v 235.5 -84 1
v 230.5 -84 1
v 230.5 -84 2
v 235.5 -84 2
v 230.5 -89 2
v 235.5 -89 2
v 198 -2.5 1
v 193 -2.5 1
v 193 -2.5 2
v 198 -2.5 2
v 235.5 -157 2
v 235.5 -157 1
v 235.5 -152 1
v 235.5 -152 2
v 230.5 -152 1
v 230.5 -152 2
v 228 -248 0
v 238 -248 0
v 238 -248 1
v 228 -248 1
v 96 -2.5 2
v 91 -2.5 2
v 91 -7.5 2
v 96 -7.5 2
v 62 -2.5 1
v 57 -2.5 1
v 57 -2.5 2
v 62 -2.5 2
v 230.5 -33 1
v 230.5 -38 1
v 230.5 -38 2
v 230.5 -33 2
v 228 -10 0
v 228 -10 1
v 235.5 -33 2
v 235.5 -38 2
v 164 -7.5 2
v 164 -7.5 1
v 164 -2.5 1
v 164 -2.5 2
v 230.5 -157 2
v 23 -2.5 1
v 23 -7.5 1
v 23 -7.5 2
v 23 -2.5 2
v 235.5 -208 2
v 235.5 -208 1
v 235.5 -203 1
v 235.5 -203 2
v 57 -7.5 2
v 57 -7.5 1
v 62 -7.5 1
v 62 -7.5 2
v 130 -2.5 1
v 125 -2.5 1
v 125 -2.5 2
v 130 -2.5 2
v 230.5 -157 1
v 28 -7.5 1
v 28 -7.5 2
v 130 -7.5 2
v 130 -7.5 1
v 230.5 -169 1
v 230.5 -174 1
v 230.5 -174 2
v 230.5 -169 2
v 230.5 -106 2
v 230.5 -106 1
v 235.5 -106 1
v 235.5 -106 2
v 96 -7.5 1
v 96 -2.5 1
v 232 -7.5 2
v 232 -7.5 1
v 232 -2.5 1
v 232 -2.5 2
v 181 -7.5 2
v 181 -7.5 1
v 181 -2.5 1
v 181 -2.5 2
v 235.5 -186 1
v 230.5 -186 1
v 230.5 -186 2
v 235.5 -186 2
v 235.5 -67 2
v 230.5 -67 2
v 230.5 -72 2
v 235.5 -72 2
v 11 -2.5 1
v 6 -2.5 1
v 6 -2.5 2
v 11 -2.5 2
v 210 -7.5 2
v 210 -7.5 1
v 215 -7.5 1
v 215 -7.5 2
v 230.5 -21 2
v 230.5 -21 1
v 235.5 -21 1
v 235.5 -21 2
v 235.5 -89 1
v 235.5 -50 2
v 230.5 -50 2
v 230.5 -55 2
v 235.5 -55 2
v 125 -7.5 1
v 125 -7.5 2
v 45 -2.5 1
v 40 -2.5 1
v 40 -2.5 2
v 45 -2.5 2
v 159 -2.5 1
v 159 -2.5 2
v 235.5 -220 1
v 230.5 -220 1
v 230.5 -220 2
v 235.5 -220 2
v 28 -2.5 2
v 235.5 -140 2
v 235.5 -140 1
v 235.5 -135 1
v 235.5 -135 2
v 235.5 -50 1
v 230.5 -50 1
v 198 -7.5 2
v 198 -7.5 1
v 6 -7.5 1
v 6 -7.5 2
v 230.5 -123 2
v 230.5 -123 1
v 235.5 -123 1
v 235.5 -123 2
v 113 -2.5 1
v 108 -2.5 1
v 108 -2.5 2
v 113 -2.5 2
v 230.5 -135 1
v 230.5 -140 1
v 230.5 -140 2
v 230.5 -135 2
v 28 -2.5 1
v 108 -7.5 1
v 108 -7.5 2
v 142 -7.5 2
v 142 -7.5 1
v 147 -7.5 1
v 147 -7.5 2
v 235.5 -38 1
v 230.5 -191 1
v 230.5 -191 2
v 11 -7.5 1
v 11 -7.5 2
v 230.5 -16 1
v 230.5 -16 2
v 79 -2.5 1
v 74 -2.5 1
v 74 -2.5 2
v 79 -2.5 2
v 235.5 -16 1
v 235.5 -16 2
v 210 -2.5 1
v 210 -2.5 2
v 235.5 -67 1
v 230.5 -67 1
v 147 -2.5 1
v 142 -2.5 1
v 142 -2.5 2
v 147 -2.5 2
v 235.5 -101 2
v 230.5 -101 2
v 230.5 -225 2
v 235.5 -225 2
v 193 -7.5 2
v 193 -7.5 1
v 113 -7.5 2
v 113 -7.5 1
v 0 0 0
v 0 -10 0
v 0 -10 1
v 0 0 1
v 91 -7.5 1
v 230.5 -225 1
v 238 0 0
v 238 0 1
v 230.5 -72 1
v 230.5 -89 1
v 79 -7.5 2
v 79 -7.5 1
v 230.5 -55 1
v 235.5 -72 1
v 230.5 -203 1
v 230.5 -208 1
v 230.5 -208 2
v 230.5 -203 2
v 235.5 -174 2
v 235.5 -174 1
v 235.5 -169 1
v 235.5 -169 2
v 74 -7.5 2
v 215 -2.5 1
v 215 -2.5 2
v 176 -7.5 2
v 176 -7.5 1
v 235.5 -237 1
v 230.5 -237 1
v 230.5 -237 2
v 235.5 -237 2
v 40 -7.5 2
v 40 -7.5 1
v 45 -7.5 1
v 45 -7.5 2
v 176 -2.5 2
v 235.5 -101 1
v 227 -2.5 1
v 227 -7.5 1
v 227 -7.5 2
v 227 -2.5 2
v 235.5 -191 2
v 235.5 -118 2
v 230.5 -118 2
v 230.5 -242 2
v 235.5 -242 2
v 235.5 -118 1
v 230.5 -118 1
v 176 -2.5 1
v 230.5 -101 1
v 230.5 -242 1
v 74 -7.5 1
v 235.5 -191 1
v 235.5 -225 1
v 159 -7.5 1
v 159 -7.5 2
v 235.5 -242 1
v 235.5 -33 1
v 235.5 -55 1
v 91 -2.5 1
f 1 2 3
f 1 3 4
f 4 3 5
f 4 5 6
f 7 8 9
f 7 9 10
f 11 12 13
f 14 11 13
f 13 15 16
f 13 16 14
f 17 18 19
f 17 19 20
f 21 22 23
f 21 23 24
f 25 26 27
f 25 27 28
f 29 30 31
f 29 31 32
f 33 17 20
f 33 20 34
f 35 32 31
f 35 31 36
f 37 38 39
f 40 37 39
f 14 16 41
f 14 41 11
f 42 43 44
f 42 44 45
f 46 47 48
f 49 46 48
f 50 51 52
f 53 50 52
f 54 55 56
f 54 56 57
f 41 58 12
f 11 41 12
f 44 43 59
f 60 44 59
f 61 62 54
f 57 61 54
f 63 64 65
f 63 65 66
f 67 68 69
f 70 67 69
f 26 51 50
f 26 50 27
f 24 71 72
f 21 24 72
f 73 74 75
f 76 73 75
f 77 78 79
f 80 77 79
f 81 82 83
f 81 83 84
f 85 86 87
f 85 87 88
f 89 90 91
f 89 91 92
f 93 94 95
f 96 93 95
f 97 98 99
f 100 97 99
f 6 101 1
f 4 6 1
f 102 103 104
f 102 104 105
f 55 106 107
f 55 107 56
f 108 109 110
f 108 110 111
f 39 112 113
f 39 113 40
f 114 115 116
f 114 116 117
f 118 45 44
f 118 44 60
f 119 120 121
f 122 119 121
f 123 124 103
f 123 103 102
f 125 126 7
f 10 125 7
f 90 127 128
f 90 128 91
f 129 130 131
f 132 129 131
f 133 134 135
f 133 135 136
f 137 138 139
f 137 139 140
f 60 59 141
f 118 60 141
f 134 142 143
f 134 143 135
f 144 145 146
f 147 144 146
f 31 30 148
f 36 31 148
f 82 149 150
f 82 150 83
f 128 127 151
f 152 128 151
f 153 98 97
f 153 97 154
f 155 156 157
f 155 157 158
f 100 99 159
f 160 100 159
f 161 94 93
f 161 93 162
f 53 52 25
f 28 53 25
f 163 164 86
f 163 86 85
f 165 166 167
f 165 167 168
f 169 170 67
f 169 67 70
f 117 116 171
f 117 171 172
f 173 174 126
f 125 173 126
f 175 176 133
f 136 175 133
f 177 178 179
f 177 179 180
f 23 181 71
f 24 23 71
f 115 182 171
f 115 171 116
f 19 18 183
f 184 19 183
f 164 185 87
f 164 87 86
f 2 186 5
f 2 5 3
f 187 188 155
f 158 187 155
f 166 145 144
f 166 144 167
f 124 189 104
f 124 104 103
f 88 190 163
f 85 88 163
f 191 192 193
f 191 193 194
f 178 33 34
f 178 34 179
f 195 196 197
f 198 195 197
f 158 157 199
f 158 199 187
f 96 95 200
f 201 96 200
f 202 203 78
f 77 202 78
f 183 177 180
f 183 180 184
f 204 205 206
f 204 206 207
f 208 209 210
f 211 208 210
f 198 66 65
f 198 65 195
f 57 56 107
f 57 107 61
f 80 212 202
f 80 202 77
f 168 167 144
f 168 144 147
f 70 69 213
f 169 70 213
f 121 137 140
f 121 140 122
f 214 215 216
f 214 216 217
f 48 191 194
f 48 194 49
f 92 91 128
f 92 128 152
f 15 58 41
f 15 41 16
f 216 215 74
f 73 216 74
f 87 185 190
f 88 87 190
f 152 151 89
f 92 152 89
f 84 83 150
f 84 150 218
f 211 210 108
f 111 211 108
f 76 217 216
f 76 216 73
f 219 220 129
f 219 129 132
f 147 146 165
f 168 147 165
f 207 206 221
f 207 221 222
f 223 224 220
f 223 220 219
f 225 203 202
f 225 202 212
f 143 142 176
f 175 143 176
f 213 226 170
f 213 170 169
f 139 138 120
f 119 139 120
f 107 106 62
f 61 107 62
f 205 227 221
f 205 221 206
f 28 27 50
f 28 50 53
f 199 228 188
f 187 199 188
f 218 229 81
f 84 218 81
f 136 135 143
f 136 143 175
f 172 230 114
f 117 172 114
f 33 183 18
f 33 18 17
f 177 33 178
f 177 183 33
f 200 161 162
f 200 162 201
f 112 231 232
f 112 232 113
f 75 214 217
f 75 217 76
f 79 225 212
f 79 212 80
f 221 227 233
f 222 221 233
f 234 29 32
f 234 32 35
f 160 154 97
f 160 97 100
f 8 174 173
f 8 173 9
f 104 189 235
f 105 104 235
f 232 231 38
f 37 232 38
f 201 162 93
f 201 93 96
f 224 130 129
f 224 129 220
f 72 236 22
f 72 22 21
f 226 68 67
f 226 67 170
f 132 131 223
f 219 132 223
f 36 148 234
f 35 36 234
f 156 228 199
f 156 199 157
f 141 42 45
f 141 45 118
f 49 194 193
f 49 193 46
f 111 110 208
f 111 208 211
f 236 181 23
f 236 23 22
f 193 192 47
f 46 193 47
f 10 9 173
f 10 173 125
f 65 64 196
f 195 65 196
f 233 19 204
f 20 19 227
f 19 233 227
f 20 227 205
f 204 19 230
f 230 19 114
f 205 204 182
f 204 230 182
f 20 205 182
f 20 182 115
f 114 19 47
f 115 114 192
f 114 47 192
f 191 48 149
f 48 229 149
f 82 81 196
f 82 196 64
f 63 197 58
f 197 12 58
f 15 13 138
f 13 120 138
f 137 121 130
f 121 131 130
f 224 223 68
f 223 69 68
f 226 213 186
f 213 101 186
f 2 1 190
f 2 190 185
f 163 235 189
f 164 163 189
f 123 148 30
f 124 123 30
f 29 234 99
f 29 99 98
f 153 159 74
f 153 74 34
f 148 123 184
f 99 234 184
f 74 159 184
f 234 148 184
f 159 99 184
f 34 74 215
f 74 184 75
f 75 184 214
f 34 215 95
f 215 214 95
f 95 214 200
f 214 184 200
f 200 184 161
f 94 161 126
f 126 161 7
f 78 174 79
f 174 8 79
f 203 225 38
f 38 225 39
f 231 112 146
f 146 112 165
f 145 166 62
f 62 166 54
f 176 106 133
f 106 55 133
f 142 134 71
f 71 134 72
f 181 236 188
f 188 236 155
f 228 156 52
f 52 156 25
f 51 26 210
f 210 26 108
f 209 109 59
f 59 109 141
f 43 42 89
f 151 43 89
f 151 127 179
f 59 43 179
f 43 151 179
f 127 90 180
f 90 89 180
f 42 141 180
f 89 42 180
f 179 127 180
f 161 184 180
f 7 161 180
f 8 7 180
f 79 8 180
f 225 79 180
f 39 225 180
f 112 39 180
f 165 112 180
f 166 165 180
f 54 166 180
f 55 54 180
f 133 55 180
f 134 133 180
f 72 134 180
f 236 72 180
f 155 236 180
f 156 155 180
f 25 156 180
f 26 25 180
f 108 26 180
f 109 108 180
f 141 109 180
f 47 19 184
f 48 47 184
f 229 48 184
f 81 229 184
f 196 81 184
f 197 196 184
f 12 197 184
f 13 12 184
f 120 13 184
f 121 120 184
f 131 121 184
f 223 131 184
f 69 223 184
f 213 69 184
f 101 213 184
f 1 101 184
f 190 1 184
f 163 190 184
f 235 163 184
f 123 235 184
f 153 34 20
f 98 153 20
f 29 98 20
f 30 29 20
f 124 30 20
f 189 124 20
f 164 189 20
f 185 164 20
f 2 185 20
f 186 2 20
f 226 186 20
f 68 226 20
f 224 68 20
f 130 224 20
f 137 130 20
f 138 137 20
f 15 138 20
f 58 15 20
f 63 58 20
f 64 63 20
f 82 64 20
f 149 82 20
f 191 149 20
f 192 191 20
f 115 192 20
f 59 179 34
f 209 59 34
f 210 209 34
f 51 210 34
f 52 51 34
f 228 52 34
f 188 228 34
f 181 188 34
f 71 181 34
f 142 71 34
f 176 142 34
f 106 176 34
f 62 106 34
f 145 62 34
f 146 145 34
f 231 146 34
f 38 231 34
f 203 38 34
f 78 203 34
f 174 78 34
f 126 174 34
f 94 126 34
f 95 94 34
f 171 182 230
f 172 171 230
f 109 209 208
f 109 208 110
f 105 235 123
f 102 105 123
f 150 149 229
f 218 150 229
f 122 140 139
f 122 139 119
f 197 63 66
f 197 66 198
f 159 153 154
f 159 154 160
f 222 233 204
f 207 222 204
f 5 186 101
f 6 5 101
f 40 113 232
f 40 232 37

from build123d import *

# Parameters (mm, degrees)
EXTRUDE_1_DEPTH = 1
SKETCH_2_W      = 5
SKETCH_2_H      = 5
EXTRUDE_2_DEPTH = 1


with BuildPart() as part:
    # 草圖1 → 填料-伸長1 (new body)
    with BuildSketch(Plane.XY):
        Polygon((0, 0), (238, 0), (238, -10), (238, -248), (228, -248), (228, -10), (0, -10), align=None)
    extrude(amount=EXTRUDE_1_DEPTH)

    # 草圖2 → 填料-伸長2 (add)
    with BuildSketch(Plane.XY.offset(1)):
        with Locations((25.5, -5)):
            Rectangle(SKETCH_2_W, SKETCH_2_H)
        with Locations((8.5, -5)):
            Rectangle(SKETCH_2_W, SKETCH_2_H)
        with Locations((42.5, -5)):
            Rectangle(SKETCH_2_W, SKETCH_2_H)
        with Locations((59.5, -5)):
            Rectangle(SKETCH_2_W, SKETCH_2_H)
        with Locations((76.5, -5)):
            Rectangle(SKETCH_2_W, SKETCH_2_H)
        with Locations((93.5, -5)):
            Rectangle(SKETCH_2_W, SKETCH_2_H)
        with Locations((110.5, -5)):
            Rectangle(SKETCH_2_W, SKETCH_2_H)
        with Locations((127.5, -5)):
            Rectangle(SKETCH_2_W, SKETCH_2_H)
        with Locations((144.5, -5)):
            Rectangle(SKETCH_2_W, SKETCH_2_H)
        with Locations((161.5, -5)):
            Rectangle(SKETCH_2_W, SKETCH_2_H)
        with Locations((178.5, -5)):
            Rectangle(SKETCH_2_W, SKETCH_2_H)
        with Locations((195.5, -5)):
            Rectangle(SKETCH_2_W, SKETCH_2_H)
        with Locations((212.5, -5)):
            Rectangle(SKETCH_2_W, SKETCH_2_H)
        with Locations((229.5, -5)):
            Rectangle(SKETCH_2_W, SKETCH_2_H)
        with Locations((233, -222.5)):
            Rectangle(SKETCH_2_W, SKETCH_2_H)
        with Locations((233, -239.5)):
            Rectangle(SKETCH_2_W, SKETCH_2_H)
        with Locations((233, -205.5)):
            Rectangle(SKETCH_2_W, SKETCH_2_H)
        with Locations((233, -188.5)):
            Rectangle(SKETCH_2_W, SKETCH_2_H)
        with Locations((233, -171.5)):
            Rectangle(SKETCH_2_W, SKETCH_2_H)
        with Locations((233, -154.5)):
            Rectangle(SKETCH_2_W, SKETCH_2_H)
        with Locations((233, -137.5)):
            Rectangle(SKETCH_2_W, SKETCH_2_H)
        with Locations((233, -120.5)):
            Rectangle(SKETCH_2_W, SKETCH_2_H)
        with Locations((233, -103.5)):
            Rectangle(SKETCH_2_W, SKETCH_2_H)
        with Locations((233, -86.5)):
            Rectangle(SKETCH_2_W, SKETCH_2_H)
        with Locations((233, -69.5)):
            Rectangle(SKETCH_2_W, SKETCH_2_H)
        with Locations((233, -52.5)):
            Rectangle(SKETCH_2_W, SKETCH_2_H)
        with Locations((233, -35.5)):
            Rectangle(SKETCH_2_W, SKETCH_2_H)
        with Locations((233, -18.5)):
            Rectangle(SKETCH_2_W, SKETCH_2_H)
    extrude(amount=EXTRUDE_2_DEPTH)


solid = part.part
